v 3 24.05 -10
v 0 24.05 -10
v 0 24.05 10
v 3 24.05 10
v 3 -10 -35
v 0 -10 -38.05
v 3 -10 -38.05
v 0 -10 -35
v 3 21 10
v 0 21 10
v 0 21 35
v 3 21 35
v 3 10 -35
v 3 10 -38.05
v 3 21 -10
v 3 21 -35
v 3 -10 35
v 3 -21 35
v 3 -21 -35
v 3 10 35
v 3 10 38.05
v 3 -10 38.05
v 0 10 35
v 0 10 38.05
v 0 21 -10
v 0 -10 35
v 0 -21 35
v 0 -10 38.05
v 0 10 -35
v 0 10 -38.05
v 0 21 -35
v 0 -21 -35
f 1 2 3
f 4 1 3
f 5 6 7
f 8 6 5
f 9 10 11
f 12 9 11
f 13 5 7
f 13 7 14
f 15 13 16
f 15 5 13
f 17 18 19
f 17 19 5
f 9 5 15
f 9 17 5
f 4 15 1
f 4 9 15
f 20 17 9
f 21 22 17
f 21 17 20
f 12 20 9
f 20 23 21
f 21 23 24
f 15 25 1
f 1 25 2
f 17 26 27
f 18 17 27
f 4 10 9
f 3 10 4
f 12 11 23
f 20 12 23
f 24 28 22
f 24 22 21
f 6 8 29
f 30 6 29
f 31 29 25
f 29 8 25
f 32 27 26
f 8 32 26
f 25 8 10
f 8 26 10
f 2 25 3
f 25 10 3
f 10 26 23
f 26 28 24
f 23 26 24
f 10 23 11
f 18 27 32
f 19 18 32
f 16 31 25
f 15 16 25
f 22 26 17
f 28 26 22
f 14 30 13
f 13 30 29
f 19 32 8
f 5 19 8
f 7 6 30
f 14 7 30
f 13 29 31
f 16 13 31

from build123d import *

# Parameters (mm, degrees)
F0_W     = 20
F0_H     = 3.05
F0_W_2   = 3.05
F0_H_2   = 20
F1_DEPTH = 3


with BuildPart() as f1:
    # F0 (on Right) → F1 (new body)
    with BuildSketch(Plane.YZ):
        Polygon((10, -35), (21, -35), (21, -10), (21, 10), (21, 35), (10, 35), (-10, 35), (-21, 35), (-21, -35), (-10, -35), align=None)
        with Locations((0, -36.525)):
            Rectangle(F0_W, F0_H)
        with Locations((22.525, 0)):
            Rectangle(F0_W_2, F0_H_2)
        with Locations((0, 36.525)):
            Rectangle(F0_W, F0_H)
    extrude(amount=F1_DEPTH)


solid = f1.part
